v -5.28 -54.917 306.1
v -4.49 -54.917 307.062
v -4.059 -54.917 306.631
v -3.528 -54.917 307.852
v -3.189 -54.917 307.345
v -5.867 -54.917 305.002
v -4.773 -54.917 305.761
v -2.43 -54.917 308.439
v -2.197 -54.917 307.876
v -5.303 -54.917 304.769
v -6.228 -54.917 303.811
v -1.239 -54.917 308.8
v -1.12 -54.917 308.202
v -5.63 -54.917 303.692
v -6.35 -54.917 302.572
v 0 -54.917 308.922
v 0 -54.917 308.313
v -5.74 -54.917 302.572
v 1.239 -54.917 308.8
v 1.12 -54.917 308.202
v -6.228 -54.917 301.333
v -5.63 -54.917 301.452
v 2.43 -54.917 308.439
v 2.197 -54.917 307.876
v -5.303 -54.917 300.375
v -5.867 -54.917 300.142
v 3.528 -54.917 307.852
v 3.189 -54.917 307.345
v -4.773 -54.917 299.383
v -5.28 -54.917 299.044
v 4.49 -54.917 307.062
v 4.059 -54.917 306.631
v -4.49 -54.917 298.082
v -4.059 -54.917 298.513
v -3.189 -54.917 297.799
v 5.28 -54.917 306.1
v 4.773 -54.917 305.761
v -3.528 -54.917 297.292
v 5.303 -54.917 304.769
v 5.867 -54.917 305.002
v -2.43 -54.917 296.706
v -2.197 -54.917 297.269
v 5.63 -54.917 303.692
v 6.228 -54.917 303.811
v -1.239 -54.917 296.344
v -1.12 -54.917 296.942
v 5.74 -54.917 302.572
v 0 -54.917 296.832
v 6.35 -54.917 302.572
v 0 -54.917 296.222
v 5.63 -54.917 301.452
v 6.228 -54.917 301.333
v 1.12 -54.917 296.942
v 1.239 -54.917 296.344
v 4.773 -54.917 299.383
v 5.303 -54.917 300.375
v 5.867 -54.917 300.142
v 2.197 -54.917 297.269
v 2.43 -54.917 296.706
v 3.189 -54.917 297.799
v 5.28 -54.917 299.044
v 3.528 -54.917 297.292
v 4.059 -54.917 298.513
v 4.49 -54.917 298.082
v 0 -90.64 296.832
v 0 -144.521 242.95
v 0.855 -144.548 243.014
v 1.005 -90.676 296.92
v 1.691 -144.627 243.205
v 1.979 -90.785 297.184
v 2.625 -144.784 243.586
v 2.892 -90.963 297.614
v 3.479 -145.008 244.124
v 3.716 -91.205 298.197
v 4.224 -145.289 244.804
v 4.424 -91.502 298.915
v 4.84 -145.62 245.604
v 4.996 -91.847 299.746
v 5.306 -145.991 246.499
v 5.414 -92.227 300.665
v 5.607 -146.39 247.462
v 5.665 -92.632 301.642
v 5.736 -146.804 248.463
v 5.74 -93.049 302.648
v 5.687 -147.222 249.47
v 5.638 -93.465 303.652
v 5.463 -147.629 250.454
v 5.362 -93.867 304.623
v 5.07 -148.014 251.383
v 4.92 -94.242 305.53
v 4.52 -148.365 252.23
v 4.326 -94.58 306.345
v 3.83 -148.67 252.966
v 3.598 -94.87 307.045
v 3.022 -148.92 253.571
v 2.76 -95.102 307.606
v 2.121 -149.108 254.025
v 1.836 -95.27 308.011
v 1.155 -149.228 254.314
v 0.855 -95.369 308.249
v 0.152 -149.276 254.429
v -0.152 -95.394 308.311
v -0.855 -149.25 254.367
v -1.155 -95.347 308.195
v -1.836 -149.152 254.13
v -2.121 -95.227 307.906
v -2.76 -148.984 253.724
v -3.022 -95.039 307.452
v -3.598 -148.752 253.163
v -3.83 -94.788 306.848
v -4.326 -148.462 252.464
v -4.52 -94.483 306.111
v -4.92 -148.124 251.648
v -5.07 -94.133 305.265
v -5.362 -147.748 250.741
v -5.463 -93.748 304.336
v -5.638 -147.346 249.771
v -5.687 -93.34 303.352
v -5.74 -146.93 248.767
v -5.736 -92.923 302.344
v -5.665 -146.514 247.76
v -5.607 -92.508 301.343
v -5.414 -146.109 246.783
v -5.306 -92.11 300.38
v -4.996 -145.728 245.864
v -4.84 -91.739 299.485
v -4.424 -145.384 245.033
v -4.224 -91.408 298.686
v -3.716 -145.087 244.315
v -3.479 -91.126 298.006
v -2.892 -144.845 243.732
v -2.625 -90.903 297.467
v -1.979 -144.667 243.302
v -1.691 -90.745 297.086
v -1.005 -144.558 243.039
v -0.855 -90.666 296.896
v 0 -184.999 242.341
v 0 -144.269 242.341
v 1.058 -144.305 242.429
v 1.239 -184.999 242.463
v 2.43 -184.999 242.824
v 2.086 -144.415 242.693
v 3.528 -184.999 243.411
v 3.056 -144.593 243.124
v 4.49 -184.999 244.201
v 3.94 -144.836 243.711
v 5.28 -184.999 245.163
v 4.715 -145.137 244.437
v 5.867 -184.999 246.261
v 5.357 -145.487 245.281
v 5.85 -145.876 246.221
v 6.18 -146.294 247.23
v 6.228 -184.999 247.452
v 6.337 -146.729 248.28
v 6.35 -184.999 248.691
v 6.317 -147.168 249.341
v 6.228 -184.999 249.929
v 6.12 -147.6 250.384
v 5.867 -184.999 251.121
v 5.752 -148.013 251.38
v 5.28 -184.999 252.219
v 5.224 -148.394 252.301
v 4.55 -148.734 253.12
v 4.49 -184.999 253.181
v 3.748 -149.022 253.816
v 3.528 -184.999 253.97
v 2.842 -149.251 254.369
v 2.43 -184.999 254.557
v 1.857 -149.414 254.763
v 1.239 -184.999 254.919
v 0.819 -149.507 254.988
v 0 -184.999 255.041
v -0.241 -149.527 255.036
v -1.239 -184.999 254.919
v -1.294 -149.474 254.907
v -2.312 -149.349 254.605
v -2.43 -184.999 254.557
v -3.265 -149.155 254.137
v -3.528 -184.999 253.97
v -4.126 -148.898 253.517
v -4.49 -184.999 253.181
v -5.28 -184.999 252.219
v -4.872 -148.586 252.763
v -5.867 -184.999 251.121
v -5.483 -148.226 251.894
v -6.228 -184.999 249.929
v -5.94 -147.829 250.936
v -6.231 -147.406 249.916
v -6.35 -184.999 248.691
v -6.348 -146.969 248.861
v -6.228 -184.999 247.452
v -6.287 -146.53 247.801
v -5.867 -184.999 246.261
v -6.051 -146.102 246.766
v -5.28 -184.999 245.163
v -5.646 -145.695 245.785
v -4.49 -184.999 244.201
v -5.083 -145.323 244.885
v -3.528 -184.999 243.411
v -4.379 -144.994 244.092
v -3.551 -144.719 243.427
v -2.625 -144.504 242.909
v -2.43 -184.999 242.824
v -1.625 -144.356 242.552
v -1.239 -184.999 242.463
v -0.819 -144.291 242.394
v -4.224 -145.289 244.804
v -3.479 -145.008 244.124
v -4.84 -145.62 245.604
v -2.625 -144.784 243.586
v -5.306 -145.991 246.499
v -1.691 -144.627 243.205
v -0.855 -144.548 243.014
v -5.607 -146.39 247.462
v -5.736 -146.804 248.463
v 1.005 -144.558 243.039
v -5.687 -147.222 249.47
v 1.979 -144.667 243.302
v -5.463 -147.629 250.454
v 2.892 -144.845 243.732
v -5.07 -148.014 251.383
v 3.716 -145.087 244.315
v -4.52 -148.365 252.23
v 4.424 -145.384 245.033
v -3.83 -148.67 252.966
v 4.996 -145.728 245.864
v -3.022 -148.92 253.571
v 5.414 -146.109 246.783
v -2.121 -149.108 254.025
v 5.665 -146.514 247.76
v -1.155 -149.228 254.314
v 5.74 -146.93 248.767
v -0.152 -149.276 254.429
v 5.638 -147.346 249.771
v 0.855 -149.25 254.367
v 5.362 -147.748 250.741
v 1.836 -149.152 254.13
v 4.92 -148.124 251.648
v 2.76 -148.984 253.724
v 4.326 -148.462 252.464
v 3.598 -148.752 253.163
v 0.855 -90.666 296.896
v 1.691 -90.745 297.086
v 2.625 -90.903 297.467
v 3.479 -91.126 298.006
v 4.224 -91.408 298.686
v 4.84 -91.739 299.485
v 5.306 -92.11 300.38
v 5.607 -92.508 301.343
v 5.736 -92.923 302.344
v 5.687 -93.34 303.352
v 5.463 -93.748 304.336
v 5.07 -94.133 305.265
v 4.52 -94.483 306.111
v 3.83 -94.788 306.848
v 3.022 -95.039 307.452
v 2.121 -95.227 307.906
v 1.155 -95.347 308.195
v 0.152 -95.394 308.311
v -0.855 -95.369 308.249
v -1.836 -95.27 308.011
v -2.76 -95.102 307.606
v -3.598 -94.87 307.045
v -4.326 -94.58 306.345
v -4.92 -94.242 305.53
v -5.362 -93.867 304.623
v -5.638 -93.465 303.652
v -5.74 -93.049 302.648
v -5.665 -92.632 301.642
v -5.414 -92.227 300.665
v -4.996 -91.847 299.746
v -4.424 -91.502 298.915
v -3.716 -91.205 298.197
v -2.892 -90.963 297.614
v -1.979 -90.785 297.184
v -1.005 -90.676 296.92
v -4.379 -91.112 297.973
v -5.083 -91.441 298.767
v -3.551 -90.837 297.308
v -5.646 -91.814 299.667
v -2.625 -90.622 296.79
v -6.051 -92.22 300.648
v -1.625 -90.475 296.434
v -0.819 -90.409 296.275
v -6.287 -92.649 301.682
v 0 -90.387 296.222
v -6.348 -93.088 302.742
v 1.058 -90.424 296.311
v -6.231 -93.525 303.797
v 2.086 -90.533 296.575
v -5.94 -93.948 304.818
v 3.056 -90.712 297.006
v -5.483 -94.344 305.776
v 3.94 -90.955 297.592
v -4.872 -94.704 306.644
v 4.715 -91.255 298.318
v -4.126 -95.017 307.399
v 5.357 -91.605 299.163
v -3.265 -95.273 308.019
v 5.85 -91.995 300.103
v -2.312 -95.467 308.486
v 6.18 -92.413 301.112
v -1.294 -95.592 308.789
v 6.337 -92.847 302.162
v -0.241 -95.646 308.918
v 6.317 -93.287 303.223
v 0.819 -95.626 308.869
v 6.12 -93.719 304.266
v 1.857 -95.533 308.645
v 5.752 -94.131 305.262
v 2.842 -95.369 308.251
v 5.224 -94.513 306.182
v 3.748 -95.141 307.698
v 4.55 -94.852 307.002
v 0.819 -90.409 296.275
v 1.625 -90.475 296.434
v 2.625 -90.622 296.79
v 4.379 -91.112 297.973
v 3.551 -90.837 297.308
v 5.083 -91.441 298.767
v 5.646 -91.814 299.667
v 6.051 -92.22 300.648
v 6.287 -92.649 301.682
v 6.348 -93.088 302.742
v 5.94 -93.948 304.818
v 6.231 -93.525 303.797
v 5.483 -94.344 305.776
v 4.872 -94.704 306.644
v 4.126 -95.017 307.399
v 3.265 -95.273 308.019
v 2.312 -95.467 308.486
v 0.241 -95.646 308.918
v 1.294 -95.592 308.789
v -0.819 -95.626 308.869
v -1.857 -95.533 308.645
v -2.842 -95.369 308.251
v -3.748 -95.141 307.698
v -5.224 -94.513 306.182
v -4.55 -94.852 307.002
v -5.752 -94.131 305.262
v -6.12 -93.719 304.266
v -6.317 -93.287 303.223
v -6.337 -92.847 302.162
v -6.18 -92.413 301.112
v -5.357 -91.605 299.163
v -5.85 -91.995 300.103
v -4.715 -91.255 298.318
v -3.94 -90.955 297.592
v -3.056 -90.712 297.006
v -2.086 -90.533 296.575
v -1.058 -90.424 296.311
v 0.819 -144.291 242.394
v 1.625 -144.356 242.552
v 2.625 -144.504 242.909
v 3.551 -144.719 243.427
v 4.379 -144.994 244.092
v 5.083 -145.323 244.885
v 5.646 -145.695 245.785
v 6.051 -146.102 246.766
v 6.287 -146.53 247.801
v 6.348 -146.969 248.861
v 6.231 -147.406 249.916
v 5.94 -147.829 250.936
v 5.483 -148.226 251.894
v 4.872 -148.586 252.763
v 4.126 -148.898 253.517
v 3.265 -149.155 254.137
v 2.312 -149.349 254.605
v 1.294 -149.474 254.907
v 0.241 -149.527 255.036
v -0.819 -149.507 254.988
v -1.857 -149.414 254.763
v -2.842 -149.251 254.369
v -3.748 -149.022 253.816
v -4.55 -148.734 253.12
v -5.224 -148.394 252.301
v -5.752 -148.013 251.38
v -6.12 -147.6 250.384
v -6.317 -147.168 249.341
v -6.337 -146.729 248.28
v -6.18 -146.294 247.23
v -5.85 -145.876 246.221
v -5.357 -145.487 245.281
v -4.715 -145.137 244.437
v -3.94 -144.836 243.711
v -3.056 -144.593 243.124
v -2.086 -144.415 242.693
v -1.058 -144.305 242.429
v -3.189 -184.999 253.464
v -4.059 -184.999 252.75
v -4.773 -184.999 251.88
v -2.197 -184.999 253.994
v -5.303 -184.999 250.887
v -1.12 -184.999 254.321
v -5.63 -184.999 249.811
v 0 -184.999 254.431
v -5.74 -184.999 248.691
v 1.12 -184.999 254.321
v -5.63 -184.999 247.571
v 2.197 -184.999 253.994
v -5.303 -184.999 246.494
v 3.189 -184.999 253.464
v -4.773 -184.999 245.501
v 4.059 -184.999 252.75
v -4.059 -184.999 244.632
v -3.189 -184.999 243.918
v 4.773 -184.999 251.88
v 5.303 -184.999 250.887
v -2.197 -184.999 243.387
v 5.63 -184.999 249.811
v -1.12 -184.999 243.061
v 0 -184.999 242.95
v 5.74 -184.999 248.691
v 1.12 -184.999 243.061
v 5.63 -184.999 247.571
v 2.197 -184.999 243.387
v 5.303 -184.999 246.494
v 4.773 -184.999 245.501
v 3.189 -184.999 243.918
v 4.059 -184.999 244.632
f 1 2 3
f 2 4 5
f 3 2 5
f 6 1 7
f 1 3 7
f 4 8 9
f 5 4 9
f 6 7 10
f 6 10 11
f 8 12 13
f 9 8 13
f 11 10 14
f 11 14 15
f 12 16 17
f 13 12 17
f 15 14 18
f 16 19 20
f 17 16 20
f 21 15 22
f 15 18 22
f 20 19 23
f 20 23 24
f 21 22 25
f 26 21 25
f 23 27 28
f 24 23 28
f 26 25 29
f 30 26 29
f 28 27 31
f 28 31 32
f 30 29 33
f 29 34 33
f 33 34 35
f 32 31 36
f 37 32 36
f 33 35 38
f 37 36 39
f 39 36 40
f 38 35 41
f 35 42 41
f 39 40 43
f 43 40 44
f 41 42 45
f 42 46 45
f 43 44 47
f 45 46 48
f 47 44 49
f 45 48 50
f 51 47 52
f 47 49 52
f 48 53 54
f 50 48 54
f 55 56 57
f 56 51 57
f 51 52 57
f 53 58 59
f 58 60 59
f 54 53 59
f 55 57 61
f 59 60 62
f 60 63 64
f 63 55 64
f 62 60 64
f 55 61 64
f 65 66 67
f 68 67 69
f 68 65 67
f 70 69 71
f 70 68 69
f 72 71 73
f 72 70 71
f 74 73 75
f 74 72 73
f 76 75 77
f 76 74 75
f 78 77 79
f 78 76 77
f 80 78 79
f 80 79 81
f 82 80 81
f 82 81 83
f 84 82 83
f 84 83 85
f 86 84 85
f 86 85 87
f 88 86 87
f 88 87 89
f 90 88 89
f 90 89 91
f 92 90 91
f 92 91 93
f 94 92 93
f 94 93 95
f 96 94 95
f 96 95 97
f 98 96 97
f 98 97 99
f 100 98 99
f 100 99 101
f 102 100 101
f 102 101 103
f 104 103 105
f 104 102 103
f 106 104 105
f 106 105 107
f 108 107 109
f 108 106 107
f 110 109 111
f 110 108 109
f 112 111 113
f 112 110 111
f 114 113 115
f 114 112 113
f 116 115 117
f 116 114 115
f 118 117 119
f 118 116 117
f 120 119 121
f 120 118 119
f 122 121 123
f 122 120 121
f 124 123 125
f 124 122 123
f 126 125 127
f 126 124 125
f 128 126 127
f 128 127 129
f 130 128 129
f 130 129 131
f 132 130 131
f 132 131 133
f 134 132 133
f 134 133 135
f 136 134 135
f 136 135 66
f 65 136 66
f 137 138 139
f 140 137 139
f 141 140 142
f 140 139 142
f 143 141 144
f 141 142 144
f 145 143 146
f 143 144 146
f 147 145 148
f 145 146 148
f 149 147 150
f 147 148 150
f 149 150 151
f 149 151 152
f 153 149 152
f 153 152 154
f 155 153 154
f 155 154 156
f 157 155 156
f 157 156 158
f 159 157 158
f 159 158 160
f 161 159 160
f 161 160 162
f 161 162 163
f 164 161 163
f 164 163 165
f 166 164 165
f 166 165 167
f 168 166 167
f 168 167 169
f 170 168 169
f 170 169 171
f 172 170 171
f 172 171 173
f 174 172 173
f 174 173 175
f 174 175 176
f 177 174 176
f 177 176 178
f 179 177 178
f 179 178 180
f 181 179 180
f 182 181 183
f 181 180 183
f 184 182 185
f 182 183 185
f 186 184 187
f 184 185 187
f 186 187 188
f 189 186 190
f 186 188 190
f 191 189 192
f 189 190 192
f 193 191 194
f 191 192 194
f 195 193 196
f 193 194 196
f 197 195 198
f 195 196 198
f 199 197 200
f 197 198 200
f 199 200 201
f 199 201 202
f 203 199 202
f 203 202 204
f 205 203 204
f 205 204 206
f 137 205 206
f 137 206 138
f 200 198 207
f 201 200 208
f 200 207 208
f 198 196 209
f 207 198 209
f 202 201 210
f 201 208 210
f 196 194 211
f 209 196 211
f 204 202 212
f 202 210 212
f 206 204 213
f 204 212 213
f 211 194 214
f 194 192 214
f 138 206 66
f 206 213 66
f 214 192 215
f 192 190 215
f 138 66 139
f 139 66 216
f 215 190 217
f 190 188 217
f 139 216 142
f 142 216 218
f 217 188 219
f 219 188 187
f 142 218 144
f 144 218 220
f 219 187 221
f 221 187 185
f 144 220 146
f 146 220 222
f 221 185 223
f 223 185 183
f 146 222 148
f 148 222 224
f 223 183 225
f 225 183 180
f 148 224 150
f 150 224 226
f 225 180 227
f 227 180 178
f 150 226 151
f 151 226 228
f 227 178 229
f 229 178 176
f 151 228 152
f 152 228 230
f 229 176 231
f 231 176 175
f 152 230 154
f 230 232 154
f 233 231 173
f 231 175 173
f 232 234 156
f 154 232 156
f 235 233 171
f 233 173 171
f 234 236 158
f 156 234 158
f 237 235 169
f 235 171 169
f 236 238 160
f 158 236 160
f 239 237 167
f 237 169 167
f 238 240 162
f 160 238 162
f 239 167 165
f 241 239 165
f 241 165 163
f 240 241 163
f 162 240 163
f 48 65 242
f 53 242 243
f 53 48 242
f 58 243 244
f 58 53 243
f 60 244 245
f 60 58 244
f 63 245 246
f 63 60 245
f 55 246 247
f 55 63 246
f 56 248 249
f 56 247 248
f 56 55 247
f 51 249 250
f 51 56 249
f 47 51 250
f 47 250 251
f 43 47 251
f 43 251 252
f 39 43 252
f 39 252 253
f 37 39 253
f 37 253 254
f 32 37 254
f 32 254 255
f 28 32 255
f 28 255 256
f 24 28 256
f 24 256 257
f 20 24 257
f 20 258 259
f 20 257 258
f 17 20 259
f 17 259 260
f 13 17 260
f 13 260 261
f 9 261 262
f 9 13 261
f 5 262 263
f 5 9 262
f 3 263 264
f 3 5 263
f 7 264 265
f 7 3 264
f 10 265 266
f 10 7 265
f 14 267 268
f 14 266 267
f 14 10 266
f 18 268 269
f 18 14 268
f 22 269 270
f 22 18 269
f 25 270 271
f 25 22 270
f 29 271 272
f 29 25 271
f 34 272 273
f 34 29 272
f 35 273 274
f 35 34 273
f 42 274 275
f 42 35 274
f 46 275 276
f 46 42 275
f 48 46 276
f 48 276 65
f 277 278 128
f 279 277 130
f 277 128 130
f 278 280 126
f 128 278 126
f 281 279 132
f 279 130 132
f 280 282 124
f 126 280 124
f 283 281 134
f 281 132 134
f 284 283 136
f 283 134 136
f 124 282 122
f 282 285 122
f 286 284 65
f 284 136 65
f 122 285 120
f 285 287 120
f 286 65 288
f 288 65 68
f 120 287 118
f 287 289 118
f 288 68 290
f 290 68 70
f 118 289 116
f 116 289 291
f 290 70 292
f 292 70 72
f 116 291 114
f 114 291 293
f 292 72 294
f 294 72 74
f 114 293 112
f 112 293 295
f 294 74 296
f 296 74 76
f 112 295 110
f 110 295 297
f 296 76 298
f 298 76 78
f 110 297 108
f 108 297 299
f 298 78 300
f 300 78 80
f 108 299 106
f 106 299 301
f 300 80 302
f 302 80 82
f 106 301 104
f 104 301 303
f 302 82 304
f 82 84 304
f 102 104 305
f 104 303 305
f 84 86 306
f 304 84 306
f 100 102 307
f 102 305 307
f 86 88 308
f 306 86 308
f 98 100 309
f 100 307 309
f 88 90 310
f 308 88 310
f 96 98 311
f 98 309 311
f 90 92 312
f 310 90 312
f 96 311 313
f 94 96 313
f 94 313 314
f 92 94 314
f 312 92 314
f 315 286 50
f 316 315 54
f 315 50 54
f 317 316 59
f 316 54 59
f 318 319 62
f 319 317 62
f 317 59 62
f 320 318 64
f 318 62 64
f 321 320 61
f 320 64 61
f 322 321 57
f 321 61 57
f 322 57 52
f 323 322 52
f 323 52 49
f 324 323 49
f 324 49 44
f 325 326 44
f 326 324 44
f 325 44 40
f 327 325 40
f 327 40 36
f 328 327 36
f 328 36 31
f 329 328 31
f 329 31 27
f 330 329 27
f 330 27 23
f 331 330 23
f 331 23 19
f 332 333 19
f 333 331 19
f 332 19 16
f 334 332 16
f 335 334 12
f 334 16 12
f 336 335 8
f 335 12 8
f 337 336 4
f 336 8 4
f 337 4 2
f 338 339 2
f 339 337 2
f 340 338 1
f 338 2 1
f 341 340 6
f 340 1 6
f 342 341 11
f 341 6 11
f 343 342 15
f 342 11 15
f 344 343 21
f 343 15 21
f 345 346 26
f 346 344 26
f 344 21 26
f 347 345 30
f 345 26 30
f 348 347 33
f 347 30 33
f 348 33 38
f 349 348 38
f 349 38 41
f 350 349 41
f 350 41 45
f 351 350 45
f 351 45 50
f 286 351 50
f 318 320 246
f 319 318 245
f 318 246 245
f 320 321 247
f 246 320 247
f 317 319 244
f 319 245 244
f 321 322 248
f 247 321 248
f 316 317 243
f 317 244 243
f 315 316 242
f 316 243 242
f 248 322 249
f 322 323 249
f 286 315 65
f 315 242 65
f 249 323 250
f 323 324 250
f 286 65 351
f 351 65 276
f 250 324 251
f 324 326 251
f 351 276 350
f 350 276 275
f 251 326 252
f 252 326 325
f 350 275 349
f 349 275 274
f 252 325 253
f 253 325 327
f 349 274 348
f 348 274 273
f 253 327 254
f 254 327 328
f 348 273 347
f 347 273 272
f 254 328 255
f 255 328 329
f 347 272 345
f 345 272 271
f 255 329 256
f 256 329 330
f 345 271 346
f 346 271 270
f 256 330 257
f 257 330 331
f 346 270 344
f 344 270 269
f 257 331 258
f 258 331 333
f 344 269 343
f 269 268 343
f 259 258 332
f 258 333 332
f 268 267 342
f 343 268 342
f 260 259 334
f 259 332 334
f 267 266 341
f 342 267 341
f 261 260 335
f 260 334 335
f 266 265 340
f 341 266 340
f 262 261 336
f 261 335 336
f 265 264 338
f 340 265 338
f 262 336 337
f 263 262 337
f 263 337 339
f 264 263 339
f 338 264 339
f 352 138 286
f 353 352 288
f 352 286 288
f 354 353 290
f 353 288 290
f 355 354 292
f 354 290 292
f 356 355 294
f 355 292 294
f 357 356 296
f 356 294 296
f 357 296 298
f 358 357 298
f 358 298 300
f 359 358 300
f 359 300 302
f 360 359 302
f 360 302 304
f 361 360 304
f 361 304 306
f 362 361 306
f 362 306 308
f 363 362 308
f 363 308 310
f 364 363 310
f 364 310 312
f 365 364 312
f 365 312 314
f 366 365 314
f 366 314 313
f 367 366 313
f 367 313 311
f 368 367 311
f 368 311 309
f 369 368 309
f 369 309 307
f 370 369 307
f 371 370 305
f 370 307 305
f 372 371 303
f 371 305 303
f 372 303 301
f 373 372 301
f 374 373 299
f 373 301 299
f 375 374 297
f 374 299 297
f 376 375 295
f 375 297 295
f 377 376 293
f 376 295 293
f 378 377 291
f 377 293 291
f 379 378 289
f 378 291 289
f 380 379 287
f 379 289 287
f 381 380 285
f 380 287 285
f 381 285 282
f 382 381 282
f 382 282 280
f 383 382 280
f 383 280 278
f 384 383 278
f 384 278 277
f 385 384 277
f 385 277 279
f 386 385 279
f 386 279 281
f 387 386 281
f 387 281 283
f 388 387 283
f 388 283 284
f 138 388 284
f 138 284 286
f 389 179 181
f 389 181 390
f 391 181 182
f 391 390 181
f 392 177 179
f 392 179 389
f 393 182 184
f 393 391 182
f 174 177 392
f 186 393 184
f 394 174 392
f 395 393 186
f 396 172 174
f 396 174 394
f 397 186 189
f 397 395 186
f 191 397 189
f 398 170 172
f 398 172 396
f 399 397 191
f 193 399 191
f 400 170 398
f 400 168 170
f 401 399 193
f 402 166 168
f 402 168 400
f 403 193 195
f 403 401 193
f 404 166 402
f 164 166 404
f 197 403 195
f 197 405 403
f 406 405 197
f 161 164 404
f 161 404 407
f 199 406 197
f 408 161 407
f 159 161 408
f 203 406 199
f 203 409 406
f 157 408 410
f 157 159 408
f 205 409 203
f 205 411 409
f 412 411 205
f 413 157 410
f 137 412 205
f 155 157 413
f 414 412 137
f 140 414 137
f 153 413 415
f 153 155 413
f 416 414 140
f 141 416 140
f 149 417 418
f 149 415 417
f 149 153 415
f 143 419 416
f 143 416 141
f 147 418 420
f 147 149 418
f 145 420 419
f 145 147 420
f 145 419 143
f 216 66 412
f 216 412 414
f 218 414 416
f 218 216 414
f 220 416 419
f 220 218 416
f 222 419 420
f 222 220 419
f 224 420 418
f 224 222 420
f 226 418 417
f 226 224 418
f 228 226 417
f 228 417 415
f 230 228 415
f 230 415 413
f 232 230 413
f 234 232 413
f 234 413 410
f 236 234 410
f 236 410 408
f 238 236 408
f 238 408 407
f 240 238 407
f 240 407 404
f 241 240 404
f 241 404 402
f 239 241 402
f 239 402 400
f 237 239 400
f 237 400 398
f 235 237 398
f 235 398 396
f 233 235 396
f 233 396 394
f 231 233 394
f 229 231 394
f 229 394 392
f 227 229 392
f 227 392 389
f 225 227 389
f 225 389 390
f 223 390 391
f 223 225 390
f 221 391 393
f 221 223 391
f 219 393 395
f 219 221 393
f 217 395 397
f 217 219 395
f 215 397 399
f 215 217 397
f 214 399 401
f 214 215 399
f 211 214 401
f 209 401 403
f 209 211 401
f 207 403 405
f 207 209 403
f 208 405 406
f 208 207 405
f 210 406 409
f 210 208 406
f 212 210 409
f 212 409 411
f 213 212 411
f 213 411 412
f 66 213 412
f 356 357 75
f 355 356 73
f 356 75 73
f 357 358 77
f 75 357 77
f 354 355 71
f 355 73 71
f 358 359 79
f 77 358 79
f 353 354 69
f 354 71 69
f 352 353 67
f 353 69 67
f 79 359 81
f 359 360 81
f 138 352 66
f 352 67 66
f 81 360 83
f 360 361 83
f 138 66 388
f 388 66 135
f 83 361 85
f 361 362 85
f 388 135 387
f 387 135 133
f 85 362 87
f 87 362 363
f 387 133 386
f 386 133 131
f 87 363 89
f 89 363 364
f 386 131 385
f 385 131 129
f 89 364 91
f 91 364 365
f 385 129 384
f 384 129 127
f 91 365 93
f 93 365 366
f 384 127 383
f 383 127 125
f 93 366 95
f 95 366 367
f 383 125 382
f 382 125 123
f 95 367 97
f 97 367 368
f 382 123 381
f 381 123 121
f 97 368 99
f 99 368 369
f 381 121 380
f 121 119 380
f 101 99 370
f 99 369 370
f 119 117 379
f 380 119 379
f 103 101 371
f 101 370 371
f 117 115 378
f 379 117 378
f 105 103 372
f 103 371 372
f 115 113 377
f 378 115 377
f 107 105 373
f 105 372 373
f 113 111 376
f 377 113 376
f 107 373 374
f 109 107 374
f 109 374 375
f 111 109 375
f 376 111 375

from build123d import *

# Parameters (mm, degrees)
SKETCH11_R                = 6.35
SKETCH11_R_2              = 5.7404
PIPE_0_5_SCH_40_1_DEPTH   = 42.819743879
SKETCH11_ON_SEGMENT_2_R   = 6.35
SKETCH11_ON_SEGMENT_2_R_2 = 5.7404
PIPE_0_5_SCH_40_1_2_DEPTH = 85.639487758
SKETCH11_ON_SEGMENT_3_R   = 6.35
SKETCH11_ON_SEGMENT_3_R_2 = 5.7404
PIPE_0_5_SCH_40_1_3_DEPTH = 42.819743879


with BuildPart() as part:
    # Sketch11 → Pipe 0.5 SCH 40(1) (new body)
    with BuildSketch(Plane(origin=(0, -54.917413554, 302.572169571), x_dir=(0, 0, -1), z_dir=(0, -1, 0))):
        Circle(SKETCH11_R)
        Circle(SKETCH11_R_2, mode=Mode.SUBTRACT)
    extrude(amount=PIPE_0_5_SCH_40_1_DEPTH)

    # Pipe 0.5 SCH 40(1) mitre 1
    split(bisect_by=Plane(origin=(0, -93.017413554, 302.572169571), x_dir=(-1, 0, 0), z_dir=(0, 0.923879533, 0.382683432)), keep=Keep.TOP)


with BuildPart() as body_2:
    # Sketch11 on segment 2 (carried to segment 2) → Pipe 0.5 SCH 40_1 2 (new body)
    with BuildSketch(Plane(origin=(0, -89.680050651, 305.909532473), x_dir=(0, 0.707106781, -0.707106781), z_dir=(0, -0.707106781, -0.707106781))):
        Circle(SKETCH11_ON_SEGMENT_2_R)
        Circle(SKETCH11_ON_SEGMENT_2_R_2, mode=Mode.SUBTRACT)
    extrude(amount=PIPE_0_5_SCH_40_1_2_DEPTH)

    # Pipe 0.5 SCH 40_1 2 mitre 1
    split(bisect_by=Plane(origin=(0, -93.017413554, 302.572169571), x_dir=(1, 0, 0), z_dir=(0, -0.923879533, -0.382683432)), keep=Keep.TOP)

    # Pipe 0.5 SCH 40_1 2 mitre 2
    split(bisect_by=Plane(origin=(0, -146.89895028, 248.690632844), x_dir=(-1, 0, 0), z_dir=(0, 0.923879533, 0.382683432)), keep=Keep.TOP)


with BuildPart() as body_3:
    # Sketch11 on segment 3 (carried to segment 3) → Pipe 0.5 SCH 40_1 3 (new body)
    with BuildSketch(Plane(origin=(0, -142.179206401, 248.690632844), x_dir=(0, 0, -1), z_dir=(0, -1, 0))):
        Circle(SKETCH11_ON_SEGMENT_3_R)
        Circle(SKETCH11_ON_SEGMENT_3_R_2, mode=Mode.SUBTRACT)
    extrude(amount=PIPE_0_5_SCH_40_1_3_DEPTH)

    # Pipe 0.5 SCH 40_1 3 mitre 1
    split(bisect_by=Plane(origin=(0, -146.89895028, 248.690632844), x_dir=(1, 0, 0), z_dir=(0, -0.923879533, -0.382683432)), keep=Keep.TOP)


solid = Compound([part.part, body_2.part, body_3.part])
